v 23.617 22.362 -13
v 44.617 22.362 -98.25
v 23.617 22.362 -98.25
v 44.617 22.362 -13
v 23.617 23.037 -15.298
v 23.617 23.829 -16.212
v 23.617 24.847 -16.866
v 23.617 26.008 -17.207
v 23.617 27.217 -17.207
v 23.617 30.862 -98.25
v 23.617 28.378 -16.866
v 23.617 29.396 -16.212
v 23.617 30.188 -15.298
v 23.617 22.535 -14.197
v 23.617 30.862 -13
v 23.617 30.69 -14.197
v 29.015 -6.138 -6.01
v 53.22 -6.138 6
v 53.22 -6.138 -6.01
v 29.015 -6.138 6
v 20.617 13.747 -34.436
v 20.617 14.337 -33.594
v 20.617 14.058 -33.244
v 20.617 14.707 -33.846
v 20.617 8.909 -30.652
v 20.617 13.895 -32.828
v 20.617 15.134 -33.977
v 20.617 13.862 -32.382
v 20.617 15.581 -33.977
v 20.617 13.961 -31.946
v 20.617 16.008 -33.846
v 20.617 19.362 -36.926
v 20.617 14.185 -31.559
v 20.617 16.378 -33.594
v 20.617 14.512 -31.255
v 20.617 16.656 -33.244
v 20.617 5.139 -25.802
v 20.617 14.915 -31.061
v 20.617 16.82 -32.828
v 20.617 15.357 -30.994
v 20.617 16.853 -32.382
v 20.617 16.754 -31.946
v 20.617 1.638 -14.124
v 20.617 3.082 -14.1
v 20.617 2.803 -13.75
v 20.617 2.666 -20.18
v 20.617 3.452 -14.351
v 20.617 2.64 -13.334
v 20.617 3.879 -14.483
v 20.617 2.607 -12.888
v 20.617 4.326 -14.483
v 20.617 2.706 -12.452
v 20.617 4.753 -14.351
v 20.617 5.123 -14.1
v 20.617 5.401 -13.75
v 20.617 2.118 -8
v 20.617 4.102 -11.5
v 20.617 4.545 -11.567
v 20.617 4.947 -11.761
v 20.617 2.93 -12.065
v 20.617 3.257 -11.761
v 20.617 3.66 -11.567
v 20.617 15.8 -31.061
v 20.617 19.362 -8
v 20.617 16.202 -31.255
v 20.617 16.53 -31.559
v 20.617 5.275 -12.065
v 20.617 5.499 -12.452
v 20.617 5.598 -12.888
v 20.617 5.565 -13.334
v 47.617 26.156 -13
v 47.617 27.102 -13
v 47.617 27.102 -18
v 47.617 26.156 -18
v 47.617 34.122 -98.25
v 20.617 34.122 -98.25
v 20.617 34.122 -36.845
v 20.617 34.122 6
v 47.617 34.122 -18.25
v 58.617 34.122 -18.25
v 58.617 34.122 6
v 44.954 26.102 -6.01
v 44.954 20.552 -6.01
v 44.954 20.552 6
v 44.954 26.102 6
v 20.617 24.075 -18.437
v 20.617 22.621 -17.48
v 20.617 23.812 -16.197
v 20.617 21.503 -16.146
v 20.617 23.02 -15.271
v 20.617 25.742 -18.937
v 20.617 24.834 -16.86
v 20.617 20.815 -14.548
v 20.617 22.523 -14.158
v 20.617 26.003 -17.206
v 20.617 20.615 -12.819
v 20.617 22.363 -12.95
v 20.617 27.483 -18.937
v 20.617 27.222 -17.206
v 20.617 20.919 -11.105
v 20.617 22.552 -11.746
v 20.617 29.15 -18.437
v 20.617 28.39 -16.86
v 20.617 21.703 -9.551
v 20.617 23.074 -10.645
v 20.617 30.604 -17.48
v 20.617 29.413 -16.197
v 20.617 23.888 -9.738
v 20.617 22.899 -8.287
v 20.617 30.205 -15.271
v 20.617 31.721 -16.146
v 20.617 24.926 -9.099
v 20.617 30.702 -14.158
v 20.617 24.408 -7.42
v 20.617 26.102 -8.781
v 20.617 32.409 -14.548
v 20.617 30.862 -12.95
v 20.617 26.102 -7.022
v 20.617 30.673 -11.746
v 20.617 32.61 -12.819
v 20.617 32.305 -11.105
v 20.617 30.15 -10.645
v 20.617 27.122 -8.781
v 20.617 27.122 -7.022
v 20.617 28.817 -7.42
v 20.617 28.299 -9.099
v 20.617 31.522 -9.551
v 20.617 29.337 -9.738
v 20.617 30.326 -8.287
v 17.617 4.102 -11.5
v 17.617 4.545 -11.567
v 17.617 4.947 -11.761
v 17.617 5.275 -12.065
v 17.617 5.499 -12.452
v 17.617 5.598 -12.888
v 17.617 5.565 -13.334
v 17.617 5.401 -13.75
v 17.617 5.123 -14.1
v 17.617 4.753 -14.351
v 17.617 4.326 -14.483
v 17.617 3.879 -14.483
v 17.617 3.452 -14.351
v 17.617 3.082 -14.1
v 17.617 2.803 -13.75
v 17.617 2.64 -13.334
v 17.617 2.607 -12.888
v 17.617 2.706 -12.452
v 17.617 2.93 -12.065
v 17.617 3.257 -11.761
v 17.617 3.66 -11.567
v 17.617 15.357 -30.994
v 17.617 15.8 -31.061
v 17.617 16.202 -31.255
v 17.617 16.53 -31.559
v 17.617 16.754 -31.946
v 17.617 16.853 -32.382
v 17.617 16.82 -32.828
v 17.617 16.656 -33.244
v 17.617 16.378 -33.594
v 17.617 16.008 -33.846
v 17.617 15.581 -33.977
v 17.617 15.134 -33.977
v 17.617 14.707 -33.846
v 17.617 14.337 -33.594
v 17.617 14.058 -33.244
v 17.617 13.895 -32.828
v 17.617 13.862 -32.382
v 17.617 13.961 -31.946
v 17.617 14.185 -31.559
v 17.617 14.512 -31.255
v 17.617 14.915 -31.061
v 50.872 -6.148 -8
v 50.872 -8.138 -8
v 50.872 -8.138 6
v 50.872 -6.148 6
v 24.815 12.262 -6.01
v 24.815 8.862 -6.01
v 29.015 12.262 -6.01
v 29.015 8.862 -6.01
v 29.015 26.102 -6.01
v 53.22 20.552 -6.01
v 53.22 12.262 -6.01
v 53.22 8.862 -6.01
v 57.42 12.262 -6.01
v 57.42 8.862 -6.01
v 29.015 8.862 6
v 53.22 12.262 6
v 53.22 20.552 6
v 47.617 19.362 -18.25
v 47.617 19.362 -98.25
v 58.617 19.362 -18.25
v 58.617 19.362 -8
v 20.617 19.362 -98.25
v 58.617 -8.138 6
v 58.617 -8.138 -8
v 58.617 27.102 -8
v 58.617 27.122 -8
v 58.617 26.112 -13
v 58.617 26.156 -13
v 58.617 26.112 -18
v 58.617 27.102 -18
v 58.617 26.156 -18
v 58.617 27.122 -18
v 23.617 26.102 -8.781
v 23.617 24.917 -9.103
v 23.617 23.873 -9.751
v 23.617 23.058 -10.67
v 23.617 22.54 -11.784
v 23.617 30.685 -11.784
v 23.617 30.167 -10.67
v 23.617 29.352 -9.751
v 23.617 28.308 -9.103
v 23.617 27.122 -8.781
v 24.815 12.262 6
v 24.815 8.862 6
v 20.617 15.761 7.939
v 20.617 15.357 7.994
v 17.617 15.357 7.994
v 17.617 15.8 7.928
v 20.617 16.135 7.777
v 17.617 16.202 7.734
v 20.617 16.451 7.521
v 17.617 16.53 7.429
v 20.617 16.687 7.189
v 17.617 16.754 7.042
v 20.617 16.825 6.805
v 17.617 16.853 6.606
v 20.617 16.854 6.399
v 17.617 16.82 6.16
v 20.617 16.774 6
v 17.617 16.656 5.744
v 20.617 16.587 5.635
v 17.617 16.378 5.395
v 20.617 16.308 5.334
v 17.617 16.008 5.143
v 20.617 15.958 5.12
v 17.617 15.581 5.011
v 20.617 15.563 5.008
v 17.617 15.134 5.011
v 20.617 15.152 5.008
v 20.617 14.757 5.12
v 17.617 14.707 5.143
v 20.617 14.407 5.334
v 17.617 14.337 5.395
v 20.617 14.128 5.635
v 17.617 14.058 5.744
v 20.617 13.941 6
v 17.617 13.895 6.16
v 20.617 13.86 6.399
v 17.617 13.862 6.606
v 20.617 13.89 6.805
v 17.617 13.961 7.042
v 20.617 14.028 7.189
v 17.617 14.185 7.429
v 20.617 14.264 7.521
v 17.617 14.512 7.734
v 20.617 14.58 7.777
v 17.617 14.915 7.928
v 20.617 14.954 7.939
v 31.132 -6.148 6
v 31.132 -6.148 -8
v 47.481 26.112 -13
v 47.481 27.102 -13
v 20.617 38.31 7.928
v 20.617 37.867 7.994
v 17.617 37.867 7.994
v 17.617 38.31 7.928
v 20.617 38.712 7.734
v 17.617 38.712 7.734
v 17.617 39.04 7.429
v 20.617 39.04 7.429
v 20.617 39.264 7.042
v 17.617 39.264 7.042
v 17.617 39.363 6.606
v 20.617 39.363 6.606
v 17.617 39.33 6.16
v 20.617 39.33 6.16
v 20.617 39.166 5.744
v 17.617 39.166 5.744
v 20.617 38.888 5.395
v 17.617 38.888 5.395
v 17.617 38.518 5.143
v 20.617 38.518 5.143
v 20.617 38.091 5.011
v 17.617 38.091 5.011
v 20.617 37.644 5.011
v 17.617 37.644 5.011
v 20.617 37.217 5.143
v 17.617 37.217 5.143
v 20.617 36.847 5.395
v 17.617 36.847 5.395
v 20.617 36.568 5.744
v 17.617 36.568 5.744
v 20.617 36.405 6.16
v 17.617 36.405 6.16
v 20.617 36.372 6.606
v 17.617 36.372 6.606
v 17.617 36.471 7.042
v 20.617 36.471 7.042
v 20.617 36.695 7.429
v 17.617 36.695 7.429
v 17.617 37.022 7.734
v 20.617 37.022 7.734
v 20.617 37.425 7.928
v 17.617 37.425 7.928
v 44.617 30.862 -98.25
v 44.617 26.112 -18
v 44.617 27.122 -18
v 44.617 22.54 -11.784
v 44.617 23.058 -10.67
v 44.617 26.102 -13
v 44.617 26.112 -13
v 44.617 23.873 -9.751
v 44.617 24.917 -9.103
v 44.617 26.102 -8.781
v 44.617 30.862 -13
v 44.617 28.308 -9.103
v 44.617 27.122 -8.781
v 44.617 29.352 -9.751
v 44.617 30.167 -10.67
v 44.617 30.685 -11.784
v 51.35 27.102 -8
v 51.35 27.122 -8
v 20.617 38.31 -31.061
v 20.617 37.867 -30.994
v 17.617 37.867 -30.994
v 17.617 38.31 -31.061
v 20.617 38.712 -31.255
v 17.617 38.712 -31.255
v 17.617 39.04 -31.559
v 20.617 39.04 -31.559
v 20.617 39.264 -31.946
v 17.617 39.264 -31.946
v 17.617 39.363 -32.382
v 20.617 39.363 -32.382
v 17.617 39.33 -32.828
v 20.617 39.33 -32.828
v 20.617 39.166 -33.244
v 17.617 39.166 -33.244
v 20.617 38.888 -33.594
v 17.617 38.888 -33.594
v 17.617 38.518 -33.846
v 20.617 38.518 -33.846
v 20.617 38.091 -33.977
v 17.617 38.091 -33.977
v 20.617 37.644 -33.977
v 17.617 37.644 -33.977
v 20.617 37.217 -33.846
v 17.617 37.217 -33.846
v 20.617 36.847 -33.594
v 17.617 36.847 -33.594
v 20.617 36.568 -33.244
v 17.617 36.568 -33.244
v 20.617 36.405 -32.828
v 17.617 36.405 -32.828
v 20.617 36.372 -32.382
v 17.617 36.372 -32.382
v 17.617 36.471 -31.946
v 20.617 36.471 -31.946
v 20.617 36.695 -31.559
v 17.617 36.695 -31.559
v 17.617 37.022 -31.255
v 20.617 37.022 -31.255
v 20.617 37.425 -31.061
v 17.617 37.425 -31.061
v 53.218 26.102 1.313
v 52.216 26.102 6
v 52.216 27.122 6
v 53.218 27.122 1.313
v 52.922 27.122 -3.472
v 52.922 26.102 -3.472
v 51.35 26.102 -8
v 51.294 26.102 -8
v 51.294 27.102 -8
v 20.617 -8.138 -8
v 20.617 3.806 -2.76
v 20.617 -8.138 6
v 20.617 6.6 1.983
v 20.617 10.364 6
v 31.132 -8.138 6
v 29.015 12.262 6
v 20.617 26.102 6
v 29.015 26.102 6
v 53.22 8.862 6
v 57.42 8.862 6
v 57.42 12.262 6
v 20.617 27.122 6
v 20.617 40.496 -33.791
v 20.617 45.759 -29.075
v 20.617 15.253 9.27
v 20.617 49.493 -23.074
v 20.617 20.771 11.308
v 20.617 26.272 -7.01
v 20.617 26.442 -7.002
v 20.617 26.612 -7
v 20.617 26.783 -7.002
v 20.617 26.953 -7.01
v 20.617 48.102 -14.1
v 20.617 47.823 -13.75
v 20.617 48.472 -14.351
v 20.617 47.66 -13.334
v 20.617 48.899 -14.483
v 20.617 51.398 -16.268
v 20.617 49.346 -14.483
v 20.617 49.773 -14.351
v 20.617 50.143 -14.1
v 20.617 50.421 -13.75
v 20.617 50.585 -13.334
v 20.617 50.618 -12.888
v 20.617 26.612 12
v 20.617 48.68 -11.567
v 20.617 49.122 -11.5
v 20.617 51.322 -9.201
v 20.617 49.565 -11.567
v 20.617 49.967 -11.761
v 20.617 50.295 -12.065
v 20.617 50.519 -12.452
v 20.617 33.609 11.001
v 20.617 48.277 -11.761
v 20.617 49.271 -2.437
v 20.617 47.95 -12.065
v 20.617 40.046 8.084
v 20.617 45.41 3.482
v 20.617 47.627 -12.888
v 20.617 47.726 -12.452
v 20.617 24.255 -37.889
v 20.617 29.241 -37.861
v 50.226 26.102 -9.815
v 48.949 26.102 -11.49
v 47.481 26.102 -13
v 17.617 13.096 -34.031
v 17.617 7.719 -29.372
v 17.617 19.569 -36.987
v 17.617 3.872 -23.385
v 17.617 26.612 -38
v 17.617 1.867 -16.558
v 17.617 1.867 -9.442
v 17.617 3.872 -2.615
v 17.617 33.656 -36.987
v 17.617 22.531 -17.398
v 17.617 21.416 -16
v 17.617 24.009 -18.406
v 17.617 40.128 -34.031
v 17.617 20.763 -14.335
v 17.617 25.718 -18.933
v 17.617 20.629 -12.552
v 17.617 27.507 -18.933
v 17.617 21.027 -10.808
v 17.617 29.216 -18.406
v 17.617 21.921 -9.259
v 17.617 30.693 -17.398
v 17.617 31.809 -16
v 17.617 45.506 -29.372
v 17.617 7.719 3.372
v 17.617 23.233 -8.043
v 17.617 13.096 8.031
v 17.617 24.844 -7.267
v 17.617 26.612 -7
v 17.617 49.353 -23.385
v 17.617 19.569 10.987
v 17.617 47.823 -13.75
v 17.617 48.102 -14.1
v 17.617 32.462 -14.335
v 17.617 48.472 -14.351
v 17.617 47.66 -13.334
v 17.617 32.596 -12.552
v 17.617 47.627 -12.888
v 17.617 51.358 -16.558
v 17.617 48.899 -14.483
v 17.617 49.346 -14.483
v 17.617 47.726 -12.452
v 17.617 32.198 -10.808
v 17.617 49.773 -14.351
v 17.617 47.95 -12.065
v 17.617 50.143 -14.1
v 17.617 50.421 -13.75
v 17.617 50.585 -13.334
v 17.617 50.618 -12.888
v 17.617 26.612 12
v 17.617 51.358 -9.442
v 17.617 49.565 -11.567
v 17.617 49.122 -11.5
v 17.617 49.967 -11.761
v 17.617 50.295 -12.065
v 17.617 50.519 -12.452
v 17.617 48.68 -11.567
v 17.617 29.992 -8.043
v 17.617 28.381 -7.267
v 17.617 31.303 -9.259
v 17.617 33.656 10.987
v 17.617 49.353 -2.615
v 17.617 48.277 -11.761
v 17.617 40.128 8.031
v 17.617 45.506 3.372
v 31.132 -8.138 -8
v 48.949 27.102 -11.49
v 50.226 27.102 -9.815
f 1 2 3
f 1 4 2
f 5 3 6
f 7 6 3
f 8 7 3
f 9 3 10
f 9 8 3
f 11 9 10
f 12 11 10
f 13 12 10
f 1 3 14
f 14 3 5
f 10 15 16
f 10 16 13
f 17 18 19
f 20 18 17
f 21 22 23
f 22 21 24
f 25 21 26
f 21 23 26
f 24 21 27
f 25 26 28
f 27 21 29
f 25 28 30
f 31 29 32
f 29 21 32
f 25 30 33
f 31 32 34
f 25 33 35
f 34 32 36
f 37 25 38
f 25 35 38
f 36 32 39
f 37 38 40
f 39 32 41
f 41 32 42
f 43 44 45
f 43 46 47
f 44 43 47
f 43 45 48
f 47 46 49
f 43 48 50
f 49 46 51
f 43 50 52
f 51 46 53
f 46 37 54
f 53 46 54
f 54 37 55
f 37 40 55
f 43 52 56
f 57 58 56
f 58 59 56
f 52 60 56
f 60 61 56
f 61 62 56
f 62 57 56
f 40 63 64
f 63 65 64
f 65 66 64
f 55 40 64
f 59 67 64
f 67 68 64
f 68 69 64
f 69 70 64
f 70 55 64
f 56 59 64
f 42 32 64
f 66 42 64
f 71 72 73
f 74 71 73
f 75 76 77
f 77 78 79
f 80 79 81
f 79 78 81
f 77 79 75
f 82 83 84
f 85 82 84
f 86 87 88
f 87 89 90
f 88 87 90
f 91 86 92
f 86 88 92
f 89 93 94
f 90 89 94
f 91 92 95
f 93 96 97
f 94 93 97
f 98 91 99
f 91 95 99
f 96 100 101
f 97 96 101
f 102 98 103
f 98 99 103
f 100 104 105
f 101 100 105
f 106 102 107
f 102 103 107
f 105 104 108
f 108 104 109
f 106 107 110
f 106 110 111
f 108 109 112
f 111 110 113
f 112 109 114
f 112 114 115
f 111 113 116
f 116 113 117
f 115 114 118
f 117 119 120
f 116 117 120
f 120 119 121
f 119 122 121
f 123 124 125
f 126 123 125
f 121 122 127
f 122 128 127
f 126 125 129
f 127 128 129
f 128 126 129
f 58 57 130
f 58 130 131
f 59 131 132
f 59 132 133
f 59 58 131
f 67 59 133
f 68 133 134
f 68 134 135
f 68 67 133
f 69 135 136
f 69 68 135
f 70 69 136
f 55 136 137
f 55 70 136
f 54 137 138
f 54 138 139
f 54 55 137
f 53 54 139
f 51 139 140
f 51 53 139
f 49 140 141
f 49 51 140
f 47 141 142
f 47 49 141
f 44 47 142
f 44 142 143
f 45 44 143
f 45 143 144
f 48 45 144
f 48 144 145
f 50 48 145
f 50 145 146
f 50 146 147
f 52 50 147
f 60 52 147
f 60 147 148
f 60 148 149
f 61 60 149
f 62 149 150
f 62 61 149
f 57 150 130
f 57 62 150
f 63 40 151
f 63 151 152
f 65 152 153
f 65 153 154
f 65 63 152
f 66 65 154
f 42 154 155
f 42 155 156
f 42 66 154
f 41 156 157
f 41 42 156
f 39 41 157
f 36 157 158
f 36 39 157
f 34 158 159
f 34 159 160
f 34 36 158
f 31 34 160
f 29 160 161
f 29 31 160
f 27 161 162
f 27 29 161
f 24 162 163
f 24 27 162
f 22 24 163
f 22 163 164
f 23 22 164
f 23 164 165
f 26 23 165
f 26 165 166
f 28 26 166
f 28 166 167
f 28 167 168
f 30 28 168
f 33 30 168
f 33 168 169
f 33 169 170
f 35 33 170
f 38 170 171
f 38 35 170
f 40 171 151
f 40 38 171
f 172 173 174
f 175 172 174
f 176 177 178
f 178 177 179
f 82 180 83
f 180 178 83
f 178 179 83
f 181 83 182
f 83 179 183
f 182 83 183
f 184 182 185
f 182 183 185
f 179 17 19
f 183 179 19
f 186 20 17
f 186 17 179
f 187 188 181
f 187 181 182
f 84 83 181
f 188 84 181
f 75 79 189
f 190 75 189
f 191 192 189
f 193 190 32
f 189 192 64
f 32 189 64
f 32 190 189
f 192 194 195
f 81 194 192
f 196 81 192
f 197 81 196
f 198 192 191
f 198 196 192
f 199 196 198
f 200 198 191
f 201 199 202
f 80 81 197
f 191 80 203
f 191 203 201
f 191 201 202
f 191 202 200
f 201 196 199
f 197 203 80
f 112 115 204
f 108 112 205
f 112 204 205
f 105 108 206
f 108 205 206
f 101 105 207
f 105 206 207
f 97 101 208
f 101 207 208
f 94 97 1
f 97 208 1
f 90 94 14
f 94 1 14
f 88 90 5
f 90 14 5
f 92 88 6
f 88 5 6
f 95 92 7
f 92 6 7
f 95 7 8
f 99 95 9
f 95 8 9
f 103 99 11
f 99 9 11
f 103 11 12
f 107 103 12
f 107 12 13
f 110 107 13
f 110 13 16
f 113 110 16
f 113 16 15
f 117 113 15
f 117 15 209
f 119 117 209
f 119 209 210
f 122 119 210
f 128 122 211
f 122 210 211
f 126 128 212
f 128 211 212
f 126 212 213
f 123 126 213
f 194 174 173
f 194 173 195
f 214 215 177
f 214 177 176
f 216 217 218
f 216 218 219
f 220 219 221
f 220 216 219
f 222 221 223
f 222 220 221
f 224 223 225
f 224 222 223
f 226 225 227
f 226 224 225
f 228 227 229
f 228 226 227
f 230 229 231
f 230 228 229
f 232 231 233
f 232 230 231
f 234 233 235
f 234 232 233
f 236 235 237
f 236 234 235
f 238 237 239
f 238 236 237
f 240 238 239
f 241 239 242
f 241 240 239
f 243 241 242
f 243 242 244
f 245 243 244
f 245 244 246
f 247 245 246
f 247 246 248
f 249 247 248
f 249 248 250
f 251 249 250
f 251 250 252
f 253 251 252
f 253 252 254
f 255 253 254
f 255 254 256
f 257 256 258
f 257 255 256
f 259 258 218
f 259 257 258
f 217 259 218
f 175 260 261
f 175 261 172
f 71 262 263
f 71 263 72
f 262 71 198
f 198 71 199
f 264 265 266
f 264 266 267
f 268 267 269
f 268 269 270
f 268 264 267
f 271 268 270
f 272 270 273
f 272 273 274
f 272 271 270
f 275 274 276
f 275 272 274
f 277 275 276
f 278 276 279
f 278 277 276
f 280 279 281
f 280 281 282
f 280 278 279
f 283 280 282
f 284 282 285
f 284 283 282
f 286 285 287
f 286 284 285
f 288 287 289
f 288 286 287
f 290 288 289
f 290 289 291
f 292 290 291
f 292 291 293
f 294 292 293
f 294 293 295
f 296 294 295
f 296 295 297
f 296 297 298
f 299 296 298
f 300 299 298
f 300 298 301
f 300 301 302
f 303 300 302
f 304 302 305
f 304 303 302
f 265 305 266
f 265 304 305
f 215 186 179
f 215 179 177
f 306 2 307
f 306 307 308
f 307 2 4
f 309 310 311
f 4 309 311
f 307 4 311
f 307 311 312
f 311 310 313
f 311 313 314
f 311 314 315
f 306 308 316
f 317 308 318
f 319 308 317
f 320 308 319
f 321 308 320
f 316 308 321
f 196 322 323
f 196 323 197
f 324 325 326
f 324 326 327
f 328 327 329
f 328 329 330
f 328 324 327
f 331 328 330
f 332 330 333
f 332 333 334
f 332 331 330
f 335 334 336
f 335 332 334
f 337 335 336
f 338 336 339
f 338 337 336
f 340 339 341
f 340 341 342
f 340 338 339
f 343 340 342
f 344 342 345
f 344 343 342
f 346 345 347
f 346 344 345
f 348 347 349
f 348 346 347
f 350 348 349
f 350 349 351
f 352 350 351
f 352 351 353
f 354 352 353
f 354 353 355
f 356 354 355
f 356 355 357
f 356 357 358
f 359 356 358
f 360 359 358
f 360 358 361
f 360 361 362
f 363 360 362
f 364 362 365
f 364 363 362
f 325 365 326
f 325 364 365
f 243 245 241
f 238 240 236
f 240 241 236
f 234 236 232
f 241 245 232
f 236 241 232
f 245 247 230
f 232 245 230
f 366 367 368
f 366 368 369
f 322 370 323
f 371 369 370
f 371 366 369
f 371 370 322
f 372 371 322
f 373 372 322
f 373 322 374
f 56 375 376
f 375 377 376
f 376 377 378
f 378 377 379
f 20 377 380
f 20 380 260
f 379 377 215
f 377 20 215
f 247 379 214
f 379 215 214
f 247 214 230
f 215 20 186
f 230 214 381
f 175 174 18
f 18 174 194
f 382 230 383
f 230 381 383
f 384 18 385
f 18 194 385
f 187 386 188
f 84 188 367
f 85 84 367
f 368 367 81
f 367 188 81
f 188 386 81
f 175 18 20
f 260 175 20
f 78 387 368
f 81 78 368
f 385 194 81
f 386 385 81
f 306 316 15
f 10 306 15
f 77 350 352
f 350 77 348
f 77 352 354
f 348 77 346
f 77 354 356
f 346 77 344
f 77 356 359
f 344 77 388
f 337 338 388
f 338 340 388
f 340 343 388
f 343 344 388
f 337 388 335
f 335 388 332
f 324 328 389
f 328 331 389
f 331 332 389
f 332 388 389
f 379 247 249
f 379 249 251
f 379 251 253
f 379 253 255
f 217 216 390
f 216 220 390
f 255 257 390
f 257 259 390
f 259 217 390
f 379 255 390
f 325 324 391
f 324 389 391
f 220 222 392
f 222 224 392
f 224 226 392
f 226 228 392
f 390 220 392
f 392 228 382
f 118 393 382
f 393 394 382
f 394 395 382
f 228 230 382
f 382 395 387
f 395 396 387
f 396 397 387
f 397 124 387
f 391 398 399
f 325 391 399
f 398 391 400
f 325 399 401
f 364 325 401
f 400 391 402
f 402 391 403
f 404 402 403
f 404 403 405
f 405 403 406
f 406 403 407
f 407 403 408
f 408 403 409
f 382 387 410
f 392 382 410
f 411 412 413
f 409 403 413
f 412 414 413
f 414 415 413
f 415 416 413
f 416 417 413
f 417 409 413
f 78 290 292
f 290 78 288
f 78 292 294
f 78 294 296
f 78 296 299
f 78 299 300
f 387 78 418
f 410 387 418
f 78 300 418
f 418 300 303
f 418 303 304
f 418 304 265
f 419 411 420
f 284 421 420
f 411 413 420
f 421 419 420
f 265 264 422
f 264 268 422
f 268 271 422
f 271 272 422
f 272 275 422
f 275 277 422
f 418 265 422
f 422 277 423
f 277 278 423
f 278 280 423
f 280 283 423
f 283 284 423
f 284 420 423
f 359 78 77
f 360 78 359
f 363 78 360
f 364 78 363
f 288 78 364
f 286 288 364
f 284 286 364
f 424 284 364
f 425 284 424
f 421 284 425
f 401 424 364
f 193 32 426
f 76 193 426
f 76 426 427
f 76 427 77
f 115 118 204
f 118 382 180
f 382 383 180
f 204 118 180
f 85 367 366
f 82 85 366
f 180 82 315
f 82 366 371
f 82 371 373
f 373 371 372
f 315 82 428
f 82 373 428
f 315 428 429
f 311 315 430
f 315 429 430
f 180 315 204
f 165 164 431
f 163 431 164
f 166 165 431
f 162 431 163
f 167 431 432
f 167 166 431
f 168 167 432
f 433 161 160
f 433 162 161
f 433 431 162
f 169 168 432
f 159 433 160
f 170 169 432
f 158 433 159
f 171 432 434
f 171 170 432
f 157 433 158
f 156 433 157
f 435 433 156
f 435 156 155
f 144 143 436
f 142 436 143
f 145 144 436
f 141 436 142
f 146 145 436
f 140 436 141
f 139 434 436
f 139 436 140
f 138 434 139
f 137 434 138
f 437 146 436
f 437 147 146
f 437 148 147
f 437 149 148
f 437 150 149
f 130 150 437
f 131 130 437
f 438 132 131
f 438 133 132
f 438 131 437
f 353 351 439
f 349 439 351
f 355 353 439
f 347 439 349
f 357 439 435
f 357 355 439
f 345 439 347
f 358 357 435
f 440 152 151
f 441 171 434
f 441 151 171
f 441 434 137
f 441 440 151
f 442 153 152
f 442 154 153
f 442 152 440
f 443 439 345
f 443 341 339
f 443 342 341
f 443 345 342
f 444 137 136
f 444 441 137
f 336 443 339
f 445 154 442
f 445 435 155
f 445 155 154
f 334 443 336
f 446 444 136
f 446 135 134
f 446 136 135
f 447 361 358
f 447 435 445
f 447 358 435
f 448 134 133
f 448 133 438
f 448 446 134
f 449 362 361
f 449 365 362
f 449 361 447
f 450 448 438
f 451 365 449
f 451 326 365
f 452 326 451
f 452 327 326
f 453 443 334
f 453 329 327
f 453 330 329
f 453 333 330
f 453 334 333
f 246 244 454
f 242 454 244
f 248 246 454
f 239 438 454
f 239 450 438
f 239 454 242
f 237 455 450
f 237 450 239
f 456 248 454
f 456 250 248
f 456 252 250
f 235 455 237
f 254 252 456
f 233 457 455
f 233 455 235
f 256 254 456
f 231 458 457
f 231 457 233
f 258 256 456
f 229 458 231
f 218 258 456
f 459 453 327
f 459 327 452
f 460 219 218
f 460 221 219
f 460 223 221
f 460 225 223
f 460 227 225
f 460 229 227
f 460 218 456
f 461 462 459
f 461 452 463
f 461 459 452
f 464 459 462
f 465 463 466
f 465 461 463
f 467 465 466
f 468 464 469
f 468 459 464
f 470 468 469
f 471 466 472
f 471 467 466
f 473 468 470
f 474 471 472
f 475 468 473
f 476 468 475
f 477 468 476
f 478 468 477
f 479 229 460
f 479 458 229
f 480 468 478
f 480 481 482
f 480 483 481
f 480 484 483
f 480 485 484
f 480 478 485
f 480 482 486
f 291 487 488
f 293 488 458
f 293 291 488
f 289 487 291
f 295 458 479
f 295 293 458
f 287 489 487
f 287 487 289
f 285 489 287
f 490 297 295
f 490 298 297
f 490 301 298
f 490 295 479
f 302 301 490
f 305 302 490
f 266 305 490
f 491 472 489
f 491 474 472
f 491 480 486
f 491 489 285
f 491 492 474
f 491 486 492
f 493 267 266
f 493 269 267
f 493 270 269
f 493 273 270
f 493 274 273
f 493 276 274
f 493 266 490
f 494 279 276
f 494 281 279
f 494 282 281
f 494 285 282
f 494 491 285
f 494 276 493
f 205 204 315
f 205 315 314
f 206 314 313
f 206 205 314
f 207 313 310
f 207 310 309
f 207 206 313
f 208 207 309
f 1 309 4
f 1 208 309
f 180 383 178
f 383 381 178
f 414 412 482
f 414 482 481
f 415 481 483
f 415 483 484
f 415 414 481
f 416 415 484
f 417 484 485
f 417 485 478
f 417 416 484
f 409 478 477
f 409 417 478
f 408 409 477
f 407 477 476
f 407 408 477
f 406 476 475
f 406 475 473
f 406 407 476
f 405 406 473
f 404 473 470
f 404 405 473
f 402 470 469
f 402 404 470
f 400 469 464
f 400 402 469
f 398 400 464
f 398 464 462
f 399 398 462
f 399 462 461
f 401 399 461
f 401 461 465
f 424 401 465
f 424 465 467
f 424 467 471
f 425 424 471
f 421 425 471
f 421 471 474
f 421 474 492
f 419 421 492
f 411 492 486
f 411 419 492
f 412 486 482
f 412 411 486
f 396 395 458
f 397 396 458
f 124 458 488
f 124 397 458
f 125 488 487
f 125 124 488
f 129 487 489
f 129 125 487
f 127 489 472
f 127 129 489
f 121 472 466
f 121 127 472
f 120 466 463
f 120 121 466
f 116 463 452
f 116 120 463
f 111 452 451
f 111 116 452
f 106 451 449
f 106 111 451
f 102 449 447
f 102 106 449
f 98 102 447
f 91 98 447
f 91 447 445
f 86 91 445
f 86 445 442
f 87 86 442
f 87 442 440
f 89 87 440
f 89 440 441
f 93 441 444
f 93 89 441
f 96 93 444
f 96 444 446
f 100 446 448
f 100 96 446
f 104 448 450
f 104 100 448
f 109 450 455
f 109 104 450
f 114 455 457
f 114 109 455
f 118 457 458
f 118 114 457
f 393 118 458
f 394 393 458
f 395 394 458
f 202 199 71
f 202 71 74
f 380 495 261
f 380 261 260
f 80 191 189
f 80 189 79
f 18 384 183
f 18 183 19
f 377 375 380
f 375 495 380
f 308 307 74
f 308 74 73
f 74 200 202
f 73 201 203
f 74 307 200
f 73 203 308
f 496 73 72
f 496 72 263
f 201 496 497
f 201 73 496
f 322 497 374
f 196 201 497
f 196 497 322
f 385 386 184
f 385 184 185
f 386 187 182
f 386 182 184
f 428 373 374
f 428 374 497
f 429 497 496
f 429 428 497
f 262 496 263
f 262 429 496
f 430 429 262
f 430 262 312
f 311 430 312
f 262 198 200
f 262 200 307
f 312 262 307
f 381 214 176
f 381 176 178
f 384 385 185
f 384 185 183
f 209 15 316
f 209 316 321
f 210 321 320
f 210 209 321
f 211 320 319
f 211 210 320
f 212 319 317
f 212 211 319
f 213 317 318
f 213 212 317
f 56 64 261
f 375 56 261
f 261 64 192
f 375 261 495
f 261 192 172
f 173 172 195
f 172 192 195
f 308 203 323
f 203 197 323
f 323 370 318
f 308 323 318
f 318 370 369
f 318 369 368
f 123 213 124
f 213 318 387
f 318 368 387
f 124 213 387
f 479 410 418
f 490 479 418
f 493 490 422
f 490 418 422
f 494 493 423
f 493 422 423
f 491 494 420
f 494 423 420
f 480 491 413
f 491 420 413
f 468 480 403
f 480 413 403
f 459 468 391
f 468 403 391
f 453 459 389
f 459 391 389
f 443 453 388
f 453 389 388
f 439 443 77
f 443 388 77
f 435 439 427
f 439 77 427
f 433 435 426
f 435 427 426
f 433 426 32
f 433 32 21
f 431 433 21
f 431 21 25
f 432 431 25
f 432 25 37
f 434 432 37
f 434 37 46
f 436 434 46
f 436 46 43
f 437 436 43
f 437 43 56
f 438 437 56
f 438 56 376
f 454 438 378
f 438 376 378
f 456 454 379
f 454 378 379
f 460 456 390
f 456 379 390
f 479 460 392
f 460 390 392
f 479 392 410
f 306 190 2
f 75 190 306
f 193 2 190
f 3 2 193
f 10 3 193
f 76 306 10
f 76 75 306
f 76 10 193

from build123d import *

# Parameters (mm, degrees)
EXTRUDE_1_DEPTH     = 14
SKETCH_3_W          = 34.989164417
SKETCH_3_H          = 23.7
EXTRUDE_2_DEPTH     = 1.99
SKETCH_4_W          = 19.73952378
SKETCH_4_H          = 14
CUT_EXTRUDE_1_DEPTH = 1.99
EXTRUDE_3_DEPTH     = 4.99
EXTRUDE_4_DEPTH     = 5.55
EXTRUDE_5_DEPTH     = 1.02
SKETCH_13_W         = 35
SKETCH_13_H         = 14
EXTRUDE_6_DEPTH     = 4
EXTRUDE_8_DEPTH     = 21
SKETCH_15_W         = 5
SKETCH_15_H         = 5.74
SKETCH_15_H_2       = 4
EXTRUDE_9_DEPTH     = 14
EXTRUDE_10_DEPTH    = 1
SKETCH_17_W         = 35
SKETCH_17_H         = 19
EXTRUDE_11_DEPTH    = 3
SKETCH_18_W         = 35
SKETCH_18_H         = 5
EXTRUDE_12_DEPTH    = 1
EXTRUDE_16_DEPTH    = 3
SKETCH_20_W         = 5.25
SKETCH_20_H         = 3.26
SKETCH_20_H_2       = 3
EXTRUDE_18_DEPTH    = 35
SKETCH_21_W         = 14
SKETCH_21_H         = 3.74
SKETCH_21_H_2       = 3.75
EXTRUDE_19_DEPTH    = 5
EXTRUDE_20_DEPTH    = 11
SKETCH_26_W         = 0.25
SKETCH_26_H         = 8.5
EXTRUDE_21_DEPTH    = 3
SKETCH_27_W         = 21
SKETCH_27_H         = 8.5
EXTRUDE_22_DEPTH    = 80
SKETCH_28_R         = 25
SKETCH_28_R_2       = 6
SKETCH_28_R_3       = 1.5
EXTRUDE_23_DEPTH    = 3


with BuildPart() as part:
    # 草图2 → 凸台-拉伸1 (new body)
    with BuildSketch(Plane.XY.offset(6)):
        Polygon((58.617261146, 15.562420382), (53.219585402, 15.562420382), (53.219585402, 12.262420382), (57.419585402, 12.262420382), (57.419585402, 8.862420382), (53.219585402, 8.862420382), (53.219585402, -6.137579618), (29.014936891, -6.137579618), (29.014936891, 8.862420382), (24.814936891, 8.862420382), (24.814936891, 12.262420382), (29.014936891, 12.262420382), (29.014936891, 15.562420382), (23.617261146, 15.562420382), (23.617261146, -8.137579618), (58.617261146, -8.137579618), align=None)
    extrude(amount=-EXTRUDE_1_DEPTH)

    # 草图3 → 凸台-拉伸2 (add)
    with BuildSketch(Plane(origin=(0, 0, -8), x_dir=(-1, 0, 0), z_dir=(0, 0, -1))):
        with Locations((-41.122678938, 3.712420382)):
            Rectangle(SKETCH_3_W, SKETCH_3_H)
    extrude(amount=-EXTRUDE_2_DEPTH)

    # 草图4 → 切除-拉伸1 (cut)
    with BuildSketch(Plane.XZ.offset(8.137579618)):
        with Locations((41.002259963, -1)):
            Rectangle(SKETCH_4_W, SKETCH_4_H)
    extrude(amount=-CUT_EXTRUDE_1_DEPTH, mode=Mode.SUBTRACT)

    # 草图7 → 凸台-拉伸3 (add)
    with BuildSketch(Plane(origin=(0, 15.562420382, 0), x_dir=(1, 0, 0), z_dir=(0, 1, 0))):
        Polygon((29.014936891, -6), (23.617261146, -6), (23.617261146, 8), (58.617261146, 8), (58.617261146, -6), (53.219585402, -6), (53.219585402, 6.01), (29.014936891, 6.01), align=None)
    extrude(amount=EXTRUDE_3_DEPTH)

    # 草图8 → 凸台-拉伸4 (add)
    with BuildSketch(Plane(origin=(0, 20.552420382, 0), x_dir=(1, 0, 0), z_dir=(0, 1, 0))):
        Polygon((23.617261146, -6), (29.014936891, -6), (29.014936891, 6.01), (44.953536614, 6.01), (44.953536614, -6), (58.617261146, -6), (58.617261146, 8), (23.617261146, 8), align=None)
    extrude(amount=EXTRUDE_4_DEPTH)

    # 草图11 → 凸台-拉伸5 (add)
    with BuildSketch(Plane(origin=(0, 26.102420382, 0), x_dir=(1, 0, 0), z_dir=(0, 1, 0))):
        with BuildLine():
            Line((51.35010895, 8), (58.617261146, 8))
            Line((58.617261146, 8), (58.617261146, -6))
            Line((58.617261146, -6), (52.21613159, -6))
            ThreePointArc((52.21613159, -6), (53.233588834, 1.089724187), (51.35010895, 8))
        make_face()
    extrude(amount=EXTRUDE_5_DEPTH)

    # 草图13 → 凸台-拉伸6 (add)
    with BuildSketch(Plane(origin=(0, 27.122420382, 0), x_dir=(1, 0, 0), z_dir=(0, 1, 0))):
        with Locations((41.117261146, 1)):
            Rectangle(SKETCH_13_W, SKETCH_13_H)
    extrude(amount=EXTRUDE_6_DEPTH)

    # 草图14 → 凸台-拉伸8 (add)
    with BuildSketch(Plane.ZY.offset(-23.617261146)):
        with BuildLine():
            Line((-8.78071096, 27.122420382), (-8, 27.122420382))
            Line((-8, 27.122420382), (-8, 31.122420382))
            Line((-8, 31.122420382), (-13, 31.122420382))
            Line((-13, 31.122420382), (-13, 30.862420382))
            ThreePointArc((-13, 30.862420382), (-10.180868928, 29.792829161), (-8.78071096, 27.122420382))
        make_face()
        with BuildLine():
            Line((-8, 26.102420382), (-8.78071096, 26.102420382))
            ThreePointArc((-8.78071096, 26.102420382), (-10.180868928, 23.432011603), (-13, 22.362420382))
            Line((-13, 22.362420382), (-13, 20.362420382))
            Line((-13, 20.362420382), (-8, 20.362420382))
            Line((-8, 20.362420382), (-8, 26.102420382))
        make_face()
    extrude(amount=-EXTRUDE_8_DEPTH)

    # 草图15 → 凸台-拉伸9 (add)
    with BuildSketch(Plane(origin=(44.617261146, 0, 0), x_dir=(0, 0, -1), z_dir=(1, 0, 0))):
        with Locations((10.5, 23.232420382)):
            Rectangle(SKETCH_15_W, SKETCH_15_H)
        with Locations((10.5, 29.122420382)):
            Rectangle(SKETCH_15_W, SKETCH_15_H_2)
    extrude(amount=EXTRUDE_9_DEPTH)

    # 草图16 → 凸台-拉伸10 (add)
    with BuildSketch(Plane(origin=(0, 26.102420382, 0), x_dir=(1, 0, 0), z_dir=(0, 1, 0))):
        with BuildLine():
            Line((47.481493106, 13), (58.617261146, 13))
            Line((58.617261146, 13), (58.617261146, 8))
            Line((58.617261146, 8), (51.2939955, 8))
            ThreePointArc((51.2939955, 8), (49.612839247, 10.671635002), (47.481493106, 13))
        make_face()
    extrude(amount=EXTRUDE_10_DEPTH)

    # 草图17 → 凸台-拉伸11 (add)
    with BuildSketch(Plane(origin=(0, 31.122420382, 0), x_dir=(1, 0, 0), z_dir=(0, 1, 0))):
        with Locations((41.117261146, 3.5)):
            Rectangle(SKETCH_17_W, SKETCH_17_H)
    extrude(amount=EXTRUDE_11_DEPTH)

    # 草图18 → 凸台-拉伸12 (add)
    with BuildSketch(Plane.XZ.offset(-20.362420382)):
        with Locations((41.117261146, -10.5)):
            Rectangle(SKETCH_18_W, SKETCH_18_H)
    extrude(amount=EXTRUDE_12_DEPTH)

    # 草图19 → 凸台-拉伸16 (add)
    with BuildSketch(Plane.ZY.offset(-23.617261146)):
        with BuildLine():
            Line((-8, 19.362420382), (-8, -8.137579618))
            Line((-8, -8.137579618), (6, -8.137579618))
            Line((6, -8.137579618), (6, 26.102420382))
            Line((6, 26.102420382), (-8.78071096, 26.102420382))
            ThreePointArc((-8.78071096, 26.102420382), (-17.25, 26.612420382), (-8.78071096, 27.122420382))
            Line((-8.78071096, 27.122420382), (6, 27.122420382))
            Line((6, 27.122420382), (6, 34.122420382))
            Line((6, 34.122420382), (-18.25, 34.122420382))
            Line((-18.25, 34.122420382), (-18.25, 19.362420382))
            Line((-18.25, 19.362420382), (-8, 19.362420382))
        make_face()
    extrude(amount=EXTRUDE_16_DEPTH)

    # 草图20 → 凸台-拉伸18 (add)
    with BuildSketch(Plane(origin=(23.617261146, 0, 0), x_dir=(0, 0, -1), z_dir=(1, 0, 0))):
        with Locations((15.625, 32.492420382)):
            Rectangle(SKETCH_20_W, SKETCH_20_H)
        with Locations((15.625, 20.862420382)):
            Rectangle(SKETCH_20_W, SKETCH_20_H_2)
    extrude(amount=EXTRUDE_18_DEPTH)

    # 草图21 → 凸台-拉伸19 (add)
    with BuildSketch(Plane(origin=(0, 0, -13), x_dir=(-1, 0, 0), z_dir=(0, 0, -1))):
        with Locations((-51.617261146, 28.992420382)):
            Rectangle(SKETCH_21_W, SKETCH_21_H)
        with Locations((-51.617261146, 24.237420382)):
            Rectangle(SKETCH_21_W, SKETCH_21_H_2)
    extrude(amount=EXTRUDE_19_DEPTH)

    # 草图22 → 凸台-拉伸20 (add)
    with BuildSketch(Plane(origin=(58.617261146, 0, 0), x_dir=(0, 0, -1), z_dir=(1, 0, 0))):
        Polygon((18, 27.102420382), (13, 27.102420382), (13, 26.155844896), (18, 26.155844896), (18, 22.362420382), (18.25, 22.362420382), (18.25, 30.862420382), (18, 30.862420382), align=None)
    extrude(amount=-EXTRUDE_20_DEPTH)

    # 草图26 → 凸台-拉伸21 (add)
    with BuildSketch(Plane.ZY.offset(-47.617261146)):
        with Locations((-18.125, 26.612420382)):
            Rectangle(SKETCH_26_W, SKETCH_26_H)
    extrude(amount=EXTRUDE_21_DEPTH)

    # 草图27 → 凸台-拉伸22 (add)
    with BuildSketch(Plane(origin=(0, 0, -18.25), x_dir=(-1, 0, 0), z_dir=(0, 0, -1))):
        Polygon((-47.617261146, 34.122420382), (-47.617261146, 30.862420382), (-47.617261146, 19.362420382), (-20.617261146, 19.362420382), (-20.617261146, 34.122420382), align=None)
        with Locations((-34.117261146, 26.612420382)):
            Rectangle(SKETCH_27_W, SKETCH_27_H, mode=Mode.SUBTRACT)
    extrude(amount=EXTRUDE_22_DEPTH)

    # 草图28 → 凸台-拉伸23 (add)
    with BuildSketch(Plane.ZY.offset(-20.617261146)):
        with Locations((-13, 26.612420382)):
            Circle(SKETCH_28_R)
        with Locations((-13, 26.612420382)):
            Circle(SKETCH_28_R_2, mode=Mode.SUBTRACT)
        with Locations((-13, 4.102420382)):
            Circle(SKETCH_28_R_3, mode=Mode.SUBTRACT)
        with Locations((-32.494231839, 15.357420382)):
            Circle(SKETCH_28_R_3, mode=Mode.SUBTRACT)
        with Locations((-32.494231839, 37.867420382)):
            Circle(SKETCH_28_R_3, mode=Mode.SUBTRACT)
        with Locations((-13, 49.122420382)):
            Circle(SKETCH_28_R_3, mode=Mode.SUBTRACT)
        with Locations((6.494231839, 37.867420382)):
            Circle(SKETCH_28_R_3, mode=Mode.SUBTRACT)
        with Locations((6.494231839, 15.357420382)):
            Circle(SKETCH_28_R_3, mode=Mode.SUBTRACT)
    extrude(amount=EXTRUDE_23_DEPTH)


solid = part.part
